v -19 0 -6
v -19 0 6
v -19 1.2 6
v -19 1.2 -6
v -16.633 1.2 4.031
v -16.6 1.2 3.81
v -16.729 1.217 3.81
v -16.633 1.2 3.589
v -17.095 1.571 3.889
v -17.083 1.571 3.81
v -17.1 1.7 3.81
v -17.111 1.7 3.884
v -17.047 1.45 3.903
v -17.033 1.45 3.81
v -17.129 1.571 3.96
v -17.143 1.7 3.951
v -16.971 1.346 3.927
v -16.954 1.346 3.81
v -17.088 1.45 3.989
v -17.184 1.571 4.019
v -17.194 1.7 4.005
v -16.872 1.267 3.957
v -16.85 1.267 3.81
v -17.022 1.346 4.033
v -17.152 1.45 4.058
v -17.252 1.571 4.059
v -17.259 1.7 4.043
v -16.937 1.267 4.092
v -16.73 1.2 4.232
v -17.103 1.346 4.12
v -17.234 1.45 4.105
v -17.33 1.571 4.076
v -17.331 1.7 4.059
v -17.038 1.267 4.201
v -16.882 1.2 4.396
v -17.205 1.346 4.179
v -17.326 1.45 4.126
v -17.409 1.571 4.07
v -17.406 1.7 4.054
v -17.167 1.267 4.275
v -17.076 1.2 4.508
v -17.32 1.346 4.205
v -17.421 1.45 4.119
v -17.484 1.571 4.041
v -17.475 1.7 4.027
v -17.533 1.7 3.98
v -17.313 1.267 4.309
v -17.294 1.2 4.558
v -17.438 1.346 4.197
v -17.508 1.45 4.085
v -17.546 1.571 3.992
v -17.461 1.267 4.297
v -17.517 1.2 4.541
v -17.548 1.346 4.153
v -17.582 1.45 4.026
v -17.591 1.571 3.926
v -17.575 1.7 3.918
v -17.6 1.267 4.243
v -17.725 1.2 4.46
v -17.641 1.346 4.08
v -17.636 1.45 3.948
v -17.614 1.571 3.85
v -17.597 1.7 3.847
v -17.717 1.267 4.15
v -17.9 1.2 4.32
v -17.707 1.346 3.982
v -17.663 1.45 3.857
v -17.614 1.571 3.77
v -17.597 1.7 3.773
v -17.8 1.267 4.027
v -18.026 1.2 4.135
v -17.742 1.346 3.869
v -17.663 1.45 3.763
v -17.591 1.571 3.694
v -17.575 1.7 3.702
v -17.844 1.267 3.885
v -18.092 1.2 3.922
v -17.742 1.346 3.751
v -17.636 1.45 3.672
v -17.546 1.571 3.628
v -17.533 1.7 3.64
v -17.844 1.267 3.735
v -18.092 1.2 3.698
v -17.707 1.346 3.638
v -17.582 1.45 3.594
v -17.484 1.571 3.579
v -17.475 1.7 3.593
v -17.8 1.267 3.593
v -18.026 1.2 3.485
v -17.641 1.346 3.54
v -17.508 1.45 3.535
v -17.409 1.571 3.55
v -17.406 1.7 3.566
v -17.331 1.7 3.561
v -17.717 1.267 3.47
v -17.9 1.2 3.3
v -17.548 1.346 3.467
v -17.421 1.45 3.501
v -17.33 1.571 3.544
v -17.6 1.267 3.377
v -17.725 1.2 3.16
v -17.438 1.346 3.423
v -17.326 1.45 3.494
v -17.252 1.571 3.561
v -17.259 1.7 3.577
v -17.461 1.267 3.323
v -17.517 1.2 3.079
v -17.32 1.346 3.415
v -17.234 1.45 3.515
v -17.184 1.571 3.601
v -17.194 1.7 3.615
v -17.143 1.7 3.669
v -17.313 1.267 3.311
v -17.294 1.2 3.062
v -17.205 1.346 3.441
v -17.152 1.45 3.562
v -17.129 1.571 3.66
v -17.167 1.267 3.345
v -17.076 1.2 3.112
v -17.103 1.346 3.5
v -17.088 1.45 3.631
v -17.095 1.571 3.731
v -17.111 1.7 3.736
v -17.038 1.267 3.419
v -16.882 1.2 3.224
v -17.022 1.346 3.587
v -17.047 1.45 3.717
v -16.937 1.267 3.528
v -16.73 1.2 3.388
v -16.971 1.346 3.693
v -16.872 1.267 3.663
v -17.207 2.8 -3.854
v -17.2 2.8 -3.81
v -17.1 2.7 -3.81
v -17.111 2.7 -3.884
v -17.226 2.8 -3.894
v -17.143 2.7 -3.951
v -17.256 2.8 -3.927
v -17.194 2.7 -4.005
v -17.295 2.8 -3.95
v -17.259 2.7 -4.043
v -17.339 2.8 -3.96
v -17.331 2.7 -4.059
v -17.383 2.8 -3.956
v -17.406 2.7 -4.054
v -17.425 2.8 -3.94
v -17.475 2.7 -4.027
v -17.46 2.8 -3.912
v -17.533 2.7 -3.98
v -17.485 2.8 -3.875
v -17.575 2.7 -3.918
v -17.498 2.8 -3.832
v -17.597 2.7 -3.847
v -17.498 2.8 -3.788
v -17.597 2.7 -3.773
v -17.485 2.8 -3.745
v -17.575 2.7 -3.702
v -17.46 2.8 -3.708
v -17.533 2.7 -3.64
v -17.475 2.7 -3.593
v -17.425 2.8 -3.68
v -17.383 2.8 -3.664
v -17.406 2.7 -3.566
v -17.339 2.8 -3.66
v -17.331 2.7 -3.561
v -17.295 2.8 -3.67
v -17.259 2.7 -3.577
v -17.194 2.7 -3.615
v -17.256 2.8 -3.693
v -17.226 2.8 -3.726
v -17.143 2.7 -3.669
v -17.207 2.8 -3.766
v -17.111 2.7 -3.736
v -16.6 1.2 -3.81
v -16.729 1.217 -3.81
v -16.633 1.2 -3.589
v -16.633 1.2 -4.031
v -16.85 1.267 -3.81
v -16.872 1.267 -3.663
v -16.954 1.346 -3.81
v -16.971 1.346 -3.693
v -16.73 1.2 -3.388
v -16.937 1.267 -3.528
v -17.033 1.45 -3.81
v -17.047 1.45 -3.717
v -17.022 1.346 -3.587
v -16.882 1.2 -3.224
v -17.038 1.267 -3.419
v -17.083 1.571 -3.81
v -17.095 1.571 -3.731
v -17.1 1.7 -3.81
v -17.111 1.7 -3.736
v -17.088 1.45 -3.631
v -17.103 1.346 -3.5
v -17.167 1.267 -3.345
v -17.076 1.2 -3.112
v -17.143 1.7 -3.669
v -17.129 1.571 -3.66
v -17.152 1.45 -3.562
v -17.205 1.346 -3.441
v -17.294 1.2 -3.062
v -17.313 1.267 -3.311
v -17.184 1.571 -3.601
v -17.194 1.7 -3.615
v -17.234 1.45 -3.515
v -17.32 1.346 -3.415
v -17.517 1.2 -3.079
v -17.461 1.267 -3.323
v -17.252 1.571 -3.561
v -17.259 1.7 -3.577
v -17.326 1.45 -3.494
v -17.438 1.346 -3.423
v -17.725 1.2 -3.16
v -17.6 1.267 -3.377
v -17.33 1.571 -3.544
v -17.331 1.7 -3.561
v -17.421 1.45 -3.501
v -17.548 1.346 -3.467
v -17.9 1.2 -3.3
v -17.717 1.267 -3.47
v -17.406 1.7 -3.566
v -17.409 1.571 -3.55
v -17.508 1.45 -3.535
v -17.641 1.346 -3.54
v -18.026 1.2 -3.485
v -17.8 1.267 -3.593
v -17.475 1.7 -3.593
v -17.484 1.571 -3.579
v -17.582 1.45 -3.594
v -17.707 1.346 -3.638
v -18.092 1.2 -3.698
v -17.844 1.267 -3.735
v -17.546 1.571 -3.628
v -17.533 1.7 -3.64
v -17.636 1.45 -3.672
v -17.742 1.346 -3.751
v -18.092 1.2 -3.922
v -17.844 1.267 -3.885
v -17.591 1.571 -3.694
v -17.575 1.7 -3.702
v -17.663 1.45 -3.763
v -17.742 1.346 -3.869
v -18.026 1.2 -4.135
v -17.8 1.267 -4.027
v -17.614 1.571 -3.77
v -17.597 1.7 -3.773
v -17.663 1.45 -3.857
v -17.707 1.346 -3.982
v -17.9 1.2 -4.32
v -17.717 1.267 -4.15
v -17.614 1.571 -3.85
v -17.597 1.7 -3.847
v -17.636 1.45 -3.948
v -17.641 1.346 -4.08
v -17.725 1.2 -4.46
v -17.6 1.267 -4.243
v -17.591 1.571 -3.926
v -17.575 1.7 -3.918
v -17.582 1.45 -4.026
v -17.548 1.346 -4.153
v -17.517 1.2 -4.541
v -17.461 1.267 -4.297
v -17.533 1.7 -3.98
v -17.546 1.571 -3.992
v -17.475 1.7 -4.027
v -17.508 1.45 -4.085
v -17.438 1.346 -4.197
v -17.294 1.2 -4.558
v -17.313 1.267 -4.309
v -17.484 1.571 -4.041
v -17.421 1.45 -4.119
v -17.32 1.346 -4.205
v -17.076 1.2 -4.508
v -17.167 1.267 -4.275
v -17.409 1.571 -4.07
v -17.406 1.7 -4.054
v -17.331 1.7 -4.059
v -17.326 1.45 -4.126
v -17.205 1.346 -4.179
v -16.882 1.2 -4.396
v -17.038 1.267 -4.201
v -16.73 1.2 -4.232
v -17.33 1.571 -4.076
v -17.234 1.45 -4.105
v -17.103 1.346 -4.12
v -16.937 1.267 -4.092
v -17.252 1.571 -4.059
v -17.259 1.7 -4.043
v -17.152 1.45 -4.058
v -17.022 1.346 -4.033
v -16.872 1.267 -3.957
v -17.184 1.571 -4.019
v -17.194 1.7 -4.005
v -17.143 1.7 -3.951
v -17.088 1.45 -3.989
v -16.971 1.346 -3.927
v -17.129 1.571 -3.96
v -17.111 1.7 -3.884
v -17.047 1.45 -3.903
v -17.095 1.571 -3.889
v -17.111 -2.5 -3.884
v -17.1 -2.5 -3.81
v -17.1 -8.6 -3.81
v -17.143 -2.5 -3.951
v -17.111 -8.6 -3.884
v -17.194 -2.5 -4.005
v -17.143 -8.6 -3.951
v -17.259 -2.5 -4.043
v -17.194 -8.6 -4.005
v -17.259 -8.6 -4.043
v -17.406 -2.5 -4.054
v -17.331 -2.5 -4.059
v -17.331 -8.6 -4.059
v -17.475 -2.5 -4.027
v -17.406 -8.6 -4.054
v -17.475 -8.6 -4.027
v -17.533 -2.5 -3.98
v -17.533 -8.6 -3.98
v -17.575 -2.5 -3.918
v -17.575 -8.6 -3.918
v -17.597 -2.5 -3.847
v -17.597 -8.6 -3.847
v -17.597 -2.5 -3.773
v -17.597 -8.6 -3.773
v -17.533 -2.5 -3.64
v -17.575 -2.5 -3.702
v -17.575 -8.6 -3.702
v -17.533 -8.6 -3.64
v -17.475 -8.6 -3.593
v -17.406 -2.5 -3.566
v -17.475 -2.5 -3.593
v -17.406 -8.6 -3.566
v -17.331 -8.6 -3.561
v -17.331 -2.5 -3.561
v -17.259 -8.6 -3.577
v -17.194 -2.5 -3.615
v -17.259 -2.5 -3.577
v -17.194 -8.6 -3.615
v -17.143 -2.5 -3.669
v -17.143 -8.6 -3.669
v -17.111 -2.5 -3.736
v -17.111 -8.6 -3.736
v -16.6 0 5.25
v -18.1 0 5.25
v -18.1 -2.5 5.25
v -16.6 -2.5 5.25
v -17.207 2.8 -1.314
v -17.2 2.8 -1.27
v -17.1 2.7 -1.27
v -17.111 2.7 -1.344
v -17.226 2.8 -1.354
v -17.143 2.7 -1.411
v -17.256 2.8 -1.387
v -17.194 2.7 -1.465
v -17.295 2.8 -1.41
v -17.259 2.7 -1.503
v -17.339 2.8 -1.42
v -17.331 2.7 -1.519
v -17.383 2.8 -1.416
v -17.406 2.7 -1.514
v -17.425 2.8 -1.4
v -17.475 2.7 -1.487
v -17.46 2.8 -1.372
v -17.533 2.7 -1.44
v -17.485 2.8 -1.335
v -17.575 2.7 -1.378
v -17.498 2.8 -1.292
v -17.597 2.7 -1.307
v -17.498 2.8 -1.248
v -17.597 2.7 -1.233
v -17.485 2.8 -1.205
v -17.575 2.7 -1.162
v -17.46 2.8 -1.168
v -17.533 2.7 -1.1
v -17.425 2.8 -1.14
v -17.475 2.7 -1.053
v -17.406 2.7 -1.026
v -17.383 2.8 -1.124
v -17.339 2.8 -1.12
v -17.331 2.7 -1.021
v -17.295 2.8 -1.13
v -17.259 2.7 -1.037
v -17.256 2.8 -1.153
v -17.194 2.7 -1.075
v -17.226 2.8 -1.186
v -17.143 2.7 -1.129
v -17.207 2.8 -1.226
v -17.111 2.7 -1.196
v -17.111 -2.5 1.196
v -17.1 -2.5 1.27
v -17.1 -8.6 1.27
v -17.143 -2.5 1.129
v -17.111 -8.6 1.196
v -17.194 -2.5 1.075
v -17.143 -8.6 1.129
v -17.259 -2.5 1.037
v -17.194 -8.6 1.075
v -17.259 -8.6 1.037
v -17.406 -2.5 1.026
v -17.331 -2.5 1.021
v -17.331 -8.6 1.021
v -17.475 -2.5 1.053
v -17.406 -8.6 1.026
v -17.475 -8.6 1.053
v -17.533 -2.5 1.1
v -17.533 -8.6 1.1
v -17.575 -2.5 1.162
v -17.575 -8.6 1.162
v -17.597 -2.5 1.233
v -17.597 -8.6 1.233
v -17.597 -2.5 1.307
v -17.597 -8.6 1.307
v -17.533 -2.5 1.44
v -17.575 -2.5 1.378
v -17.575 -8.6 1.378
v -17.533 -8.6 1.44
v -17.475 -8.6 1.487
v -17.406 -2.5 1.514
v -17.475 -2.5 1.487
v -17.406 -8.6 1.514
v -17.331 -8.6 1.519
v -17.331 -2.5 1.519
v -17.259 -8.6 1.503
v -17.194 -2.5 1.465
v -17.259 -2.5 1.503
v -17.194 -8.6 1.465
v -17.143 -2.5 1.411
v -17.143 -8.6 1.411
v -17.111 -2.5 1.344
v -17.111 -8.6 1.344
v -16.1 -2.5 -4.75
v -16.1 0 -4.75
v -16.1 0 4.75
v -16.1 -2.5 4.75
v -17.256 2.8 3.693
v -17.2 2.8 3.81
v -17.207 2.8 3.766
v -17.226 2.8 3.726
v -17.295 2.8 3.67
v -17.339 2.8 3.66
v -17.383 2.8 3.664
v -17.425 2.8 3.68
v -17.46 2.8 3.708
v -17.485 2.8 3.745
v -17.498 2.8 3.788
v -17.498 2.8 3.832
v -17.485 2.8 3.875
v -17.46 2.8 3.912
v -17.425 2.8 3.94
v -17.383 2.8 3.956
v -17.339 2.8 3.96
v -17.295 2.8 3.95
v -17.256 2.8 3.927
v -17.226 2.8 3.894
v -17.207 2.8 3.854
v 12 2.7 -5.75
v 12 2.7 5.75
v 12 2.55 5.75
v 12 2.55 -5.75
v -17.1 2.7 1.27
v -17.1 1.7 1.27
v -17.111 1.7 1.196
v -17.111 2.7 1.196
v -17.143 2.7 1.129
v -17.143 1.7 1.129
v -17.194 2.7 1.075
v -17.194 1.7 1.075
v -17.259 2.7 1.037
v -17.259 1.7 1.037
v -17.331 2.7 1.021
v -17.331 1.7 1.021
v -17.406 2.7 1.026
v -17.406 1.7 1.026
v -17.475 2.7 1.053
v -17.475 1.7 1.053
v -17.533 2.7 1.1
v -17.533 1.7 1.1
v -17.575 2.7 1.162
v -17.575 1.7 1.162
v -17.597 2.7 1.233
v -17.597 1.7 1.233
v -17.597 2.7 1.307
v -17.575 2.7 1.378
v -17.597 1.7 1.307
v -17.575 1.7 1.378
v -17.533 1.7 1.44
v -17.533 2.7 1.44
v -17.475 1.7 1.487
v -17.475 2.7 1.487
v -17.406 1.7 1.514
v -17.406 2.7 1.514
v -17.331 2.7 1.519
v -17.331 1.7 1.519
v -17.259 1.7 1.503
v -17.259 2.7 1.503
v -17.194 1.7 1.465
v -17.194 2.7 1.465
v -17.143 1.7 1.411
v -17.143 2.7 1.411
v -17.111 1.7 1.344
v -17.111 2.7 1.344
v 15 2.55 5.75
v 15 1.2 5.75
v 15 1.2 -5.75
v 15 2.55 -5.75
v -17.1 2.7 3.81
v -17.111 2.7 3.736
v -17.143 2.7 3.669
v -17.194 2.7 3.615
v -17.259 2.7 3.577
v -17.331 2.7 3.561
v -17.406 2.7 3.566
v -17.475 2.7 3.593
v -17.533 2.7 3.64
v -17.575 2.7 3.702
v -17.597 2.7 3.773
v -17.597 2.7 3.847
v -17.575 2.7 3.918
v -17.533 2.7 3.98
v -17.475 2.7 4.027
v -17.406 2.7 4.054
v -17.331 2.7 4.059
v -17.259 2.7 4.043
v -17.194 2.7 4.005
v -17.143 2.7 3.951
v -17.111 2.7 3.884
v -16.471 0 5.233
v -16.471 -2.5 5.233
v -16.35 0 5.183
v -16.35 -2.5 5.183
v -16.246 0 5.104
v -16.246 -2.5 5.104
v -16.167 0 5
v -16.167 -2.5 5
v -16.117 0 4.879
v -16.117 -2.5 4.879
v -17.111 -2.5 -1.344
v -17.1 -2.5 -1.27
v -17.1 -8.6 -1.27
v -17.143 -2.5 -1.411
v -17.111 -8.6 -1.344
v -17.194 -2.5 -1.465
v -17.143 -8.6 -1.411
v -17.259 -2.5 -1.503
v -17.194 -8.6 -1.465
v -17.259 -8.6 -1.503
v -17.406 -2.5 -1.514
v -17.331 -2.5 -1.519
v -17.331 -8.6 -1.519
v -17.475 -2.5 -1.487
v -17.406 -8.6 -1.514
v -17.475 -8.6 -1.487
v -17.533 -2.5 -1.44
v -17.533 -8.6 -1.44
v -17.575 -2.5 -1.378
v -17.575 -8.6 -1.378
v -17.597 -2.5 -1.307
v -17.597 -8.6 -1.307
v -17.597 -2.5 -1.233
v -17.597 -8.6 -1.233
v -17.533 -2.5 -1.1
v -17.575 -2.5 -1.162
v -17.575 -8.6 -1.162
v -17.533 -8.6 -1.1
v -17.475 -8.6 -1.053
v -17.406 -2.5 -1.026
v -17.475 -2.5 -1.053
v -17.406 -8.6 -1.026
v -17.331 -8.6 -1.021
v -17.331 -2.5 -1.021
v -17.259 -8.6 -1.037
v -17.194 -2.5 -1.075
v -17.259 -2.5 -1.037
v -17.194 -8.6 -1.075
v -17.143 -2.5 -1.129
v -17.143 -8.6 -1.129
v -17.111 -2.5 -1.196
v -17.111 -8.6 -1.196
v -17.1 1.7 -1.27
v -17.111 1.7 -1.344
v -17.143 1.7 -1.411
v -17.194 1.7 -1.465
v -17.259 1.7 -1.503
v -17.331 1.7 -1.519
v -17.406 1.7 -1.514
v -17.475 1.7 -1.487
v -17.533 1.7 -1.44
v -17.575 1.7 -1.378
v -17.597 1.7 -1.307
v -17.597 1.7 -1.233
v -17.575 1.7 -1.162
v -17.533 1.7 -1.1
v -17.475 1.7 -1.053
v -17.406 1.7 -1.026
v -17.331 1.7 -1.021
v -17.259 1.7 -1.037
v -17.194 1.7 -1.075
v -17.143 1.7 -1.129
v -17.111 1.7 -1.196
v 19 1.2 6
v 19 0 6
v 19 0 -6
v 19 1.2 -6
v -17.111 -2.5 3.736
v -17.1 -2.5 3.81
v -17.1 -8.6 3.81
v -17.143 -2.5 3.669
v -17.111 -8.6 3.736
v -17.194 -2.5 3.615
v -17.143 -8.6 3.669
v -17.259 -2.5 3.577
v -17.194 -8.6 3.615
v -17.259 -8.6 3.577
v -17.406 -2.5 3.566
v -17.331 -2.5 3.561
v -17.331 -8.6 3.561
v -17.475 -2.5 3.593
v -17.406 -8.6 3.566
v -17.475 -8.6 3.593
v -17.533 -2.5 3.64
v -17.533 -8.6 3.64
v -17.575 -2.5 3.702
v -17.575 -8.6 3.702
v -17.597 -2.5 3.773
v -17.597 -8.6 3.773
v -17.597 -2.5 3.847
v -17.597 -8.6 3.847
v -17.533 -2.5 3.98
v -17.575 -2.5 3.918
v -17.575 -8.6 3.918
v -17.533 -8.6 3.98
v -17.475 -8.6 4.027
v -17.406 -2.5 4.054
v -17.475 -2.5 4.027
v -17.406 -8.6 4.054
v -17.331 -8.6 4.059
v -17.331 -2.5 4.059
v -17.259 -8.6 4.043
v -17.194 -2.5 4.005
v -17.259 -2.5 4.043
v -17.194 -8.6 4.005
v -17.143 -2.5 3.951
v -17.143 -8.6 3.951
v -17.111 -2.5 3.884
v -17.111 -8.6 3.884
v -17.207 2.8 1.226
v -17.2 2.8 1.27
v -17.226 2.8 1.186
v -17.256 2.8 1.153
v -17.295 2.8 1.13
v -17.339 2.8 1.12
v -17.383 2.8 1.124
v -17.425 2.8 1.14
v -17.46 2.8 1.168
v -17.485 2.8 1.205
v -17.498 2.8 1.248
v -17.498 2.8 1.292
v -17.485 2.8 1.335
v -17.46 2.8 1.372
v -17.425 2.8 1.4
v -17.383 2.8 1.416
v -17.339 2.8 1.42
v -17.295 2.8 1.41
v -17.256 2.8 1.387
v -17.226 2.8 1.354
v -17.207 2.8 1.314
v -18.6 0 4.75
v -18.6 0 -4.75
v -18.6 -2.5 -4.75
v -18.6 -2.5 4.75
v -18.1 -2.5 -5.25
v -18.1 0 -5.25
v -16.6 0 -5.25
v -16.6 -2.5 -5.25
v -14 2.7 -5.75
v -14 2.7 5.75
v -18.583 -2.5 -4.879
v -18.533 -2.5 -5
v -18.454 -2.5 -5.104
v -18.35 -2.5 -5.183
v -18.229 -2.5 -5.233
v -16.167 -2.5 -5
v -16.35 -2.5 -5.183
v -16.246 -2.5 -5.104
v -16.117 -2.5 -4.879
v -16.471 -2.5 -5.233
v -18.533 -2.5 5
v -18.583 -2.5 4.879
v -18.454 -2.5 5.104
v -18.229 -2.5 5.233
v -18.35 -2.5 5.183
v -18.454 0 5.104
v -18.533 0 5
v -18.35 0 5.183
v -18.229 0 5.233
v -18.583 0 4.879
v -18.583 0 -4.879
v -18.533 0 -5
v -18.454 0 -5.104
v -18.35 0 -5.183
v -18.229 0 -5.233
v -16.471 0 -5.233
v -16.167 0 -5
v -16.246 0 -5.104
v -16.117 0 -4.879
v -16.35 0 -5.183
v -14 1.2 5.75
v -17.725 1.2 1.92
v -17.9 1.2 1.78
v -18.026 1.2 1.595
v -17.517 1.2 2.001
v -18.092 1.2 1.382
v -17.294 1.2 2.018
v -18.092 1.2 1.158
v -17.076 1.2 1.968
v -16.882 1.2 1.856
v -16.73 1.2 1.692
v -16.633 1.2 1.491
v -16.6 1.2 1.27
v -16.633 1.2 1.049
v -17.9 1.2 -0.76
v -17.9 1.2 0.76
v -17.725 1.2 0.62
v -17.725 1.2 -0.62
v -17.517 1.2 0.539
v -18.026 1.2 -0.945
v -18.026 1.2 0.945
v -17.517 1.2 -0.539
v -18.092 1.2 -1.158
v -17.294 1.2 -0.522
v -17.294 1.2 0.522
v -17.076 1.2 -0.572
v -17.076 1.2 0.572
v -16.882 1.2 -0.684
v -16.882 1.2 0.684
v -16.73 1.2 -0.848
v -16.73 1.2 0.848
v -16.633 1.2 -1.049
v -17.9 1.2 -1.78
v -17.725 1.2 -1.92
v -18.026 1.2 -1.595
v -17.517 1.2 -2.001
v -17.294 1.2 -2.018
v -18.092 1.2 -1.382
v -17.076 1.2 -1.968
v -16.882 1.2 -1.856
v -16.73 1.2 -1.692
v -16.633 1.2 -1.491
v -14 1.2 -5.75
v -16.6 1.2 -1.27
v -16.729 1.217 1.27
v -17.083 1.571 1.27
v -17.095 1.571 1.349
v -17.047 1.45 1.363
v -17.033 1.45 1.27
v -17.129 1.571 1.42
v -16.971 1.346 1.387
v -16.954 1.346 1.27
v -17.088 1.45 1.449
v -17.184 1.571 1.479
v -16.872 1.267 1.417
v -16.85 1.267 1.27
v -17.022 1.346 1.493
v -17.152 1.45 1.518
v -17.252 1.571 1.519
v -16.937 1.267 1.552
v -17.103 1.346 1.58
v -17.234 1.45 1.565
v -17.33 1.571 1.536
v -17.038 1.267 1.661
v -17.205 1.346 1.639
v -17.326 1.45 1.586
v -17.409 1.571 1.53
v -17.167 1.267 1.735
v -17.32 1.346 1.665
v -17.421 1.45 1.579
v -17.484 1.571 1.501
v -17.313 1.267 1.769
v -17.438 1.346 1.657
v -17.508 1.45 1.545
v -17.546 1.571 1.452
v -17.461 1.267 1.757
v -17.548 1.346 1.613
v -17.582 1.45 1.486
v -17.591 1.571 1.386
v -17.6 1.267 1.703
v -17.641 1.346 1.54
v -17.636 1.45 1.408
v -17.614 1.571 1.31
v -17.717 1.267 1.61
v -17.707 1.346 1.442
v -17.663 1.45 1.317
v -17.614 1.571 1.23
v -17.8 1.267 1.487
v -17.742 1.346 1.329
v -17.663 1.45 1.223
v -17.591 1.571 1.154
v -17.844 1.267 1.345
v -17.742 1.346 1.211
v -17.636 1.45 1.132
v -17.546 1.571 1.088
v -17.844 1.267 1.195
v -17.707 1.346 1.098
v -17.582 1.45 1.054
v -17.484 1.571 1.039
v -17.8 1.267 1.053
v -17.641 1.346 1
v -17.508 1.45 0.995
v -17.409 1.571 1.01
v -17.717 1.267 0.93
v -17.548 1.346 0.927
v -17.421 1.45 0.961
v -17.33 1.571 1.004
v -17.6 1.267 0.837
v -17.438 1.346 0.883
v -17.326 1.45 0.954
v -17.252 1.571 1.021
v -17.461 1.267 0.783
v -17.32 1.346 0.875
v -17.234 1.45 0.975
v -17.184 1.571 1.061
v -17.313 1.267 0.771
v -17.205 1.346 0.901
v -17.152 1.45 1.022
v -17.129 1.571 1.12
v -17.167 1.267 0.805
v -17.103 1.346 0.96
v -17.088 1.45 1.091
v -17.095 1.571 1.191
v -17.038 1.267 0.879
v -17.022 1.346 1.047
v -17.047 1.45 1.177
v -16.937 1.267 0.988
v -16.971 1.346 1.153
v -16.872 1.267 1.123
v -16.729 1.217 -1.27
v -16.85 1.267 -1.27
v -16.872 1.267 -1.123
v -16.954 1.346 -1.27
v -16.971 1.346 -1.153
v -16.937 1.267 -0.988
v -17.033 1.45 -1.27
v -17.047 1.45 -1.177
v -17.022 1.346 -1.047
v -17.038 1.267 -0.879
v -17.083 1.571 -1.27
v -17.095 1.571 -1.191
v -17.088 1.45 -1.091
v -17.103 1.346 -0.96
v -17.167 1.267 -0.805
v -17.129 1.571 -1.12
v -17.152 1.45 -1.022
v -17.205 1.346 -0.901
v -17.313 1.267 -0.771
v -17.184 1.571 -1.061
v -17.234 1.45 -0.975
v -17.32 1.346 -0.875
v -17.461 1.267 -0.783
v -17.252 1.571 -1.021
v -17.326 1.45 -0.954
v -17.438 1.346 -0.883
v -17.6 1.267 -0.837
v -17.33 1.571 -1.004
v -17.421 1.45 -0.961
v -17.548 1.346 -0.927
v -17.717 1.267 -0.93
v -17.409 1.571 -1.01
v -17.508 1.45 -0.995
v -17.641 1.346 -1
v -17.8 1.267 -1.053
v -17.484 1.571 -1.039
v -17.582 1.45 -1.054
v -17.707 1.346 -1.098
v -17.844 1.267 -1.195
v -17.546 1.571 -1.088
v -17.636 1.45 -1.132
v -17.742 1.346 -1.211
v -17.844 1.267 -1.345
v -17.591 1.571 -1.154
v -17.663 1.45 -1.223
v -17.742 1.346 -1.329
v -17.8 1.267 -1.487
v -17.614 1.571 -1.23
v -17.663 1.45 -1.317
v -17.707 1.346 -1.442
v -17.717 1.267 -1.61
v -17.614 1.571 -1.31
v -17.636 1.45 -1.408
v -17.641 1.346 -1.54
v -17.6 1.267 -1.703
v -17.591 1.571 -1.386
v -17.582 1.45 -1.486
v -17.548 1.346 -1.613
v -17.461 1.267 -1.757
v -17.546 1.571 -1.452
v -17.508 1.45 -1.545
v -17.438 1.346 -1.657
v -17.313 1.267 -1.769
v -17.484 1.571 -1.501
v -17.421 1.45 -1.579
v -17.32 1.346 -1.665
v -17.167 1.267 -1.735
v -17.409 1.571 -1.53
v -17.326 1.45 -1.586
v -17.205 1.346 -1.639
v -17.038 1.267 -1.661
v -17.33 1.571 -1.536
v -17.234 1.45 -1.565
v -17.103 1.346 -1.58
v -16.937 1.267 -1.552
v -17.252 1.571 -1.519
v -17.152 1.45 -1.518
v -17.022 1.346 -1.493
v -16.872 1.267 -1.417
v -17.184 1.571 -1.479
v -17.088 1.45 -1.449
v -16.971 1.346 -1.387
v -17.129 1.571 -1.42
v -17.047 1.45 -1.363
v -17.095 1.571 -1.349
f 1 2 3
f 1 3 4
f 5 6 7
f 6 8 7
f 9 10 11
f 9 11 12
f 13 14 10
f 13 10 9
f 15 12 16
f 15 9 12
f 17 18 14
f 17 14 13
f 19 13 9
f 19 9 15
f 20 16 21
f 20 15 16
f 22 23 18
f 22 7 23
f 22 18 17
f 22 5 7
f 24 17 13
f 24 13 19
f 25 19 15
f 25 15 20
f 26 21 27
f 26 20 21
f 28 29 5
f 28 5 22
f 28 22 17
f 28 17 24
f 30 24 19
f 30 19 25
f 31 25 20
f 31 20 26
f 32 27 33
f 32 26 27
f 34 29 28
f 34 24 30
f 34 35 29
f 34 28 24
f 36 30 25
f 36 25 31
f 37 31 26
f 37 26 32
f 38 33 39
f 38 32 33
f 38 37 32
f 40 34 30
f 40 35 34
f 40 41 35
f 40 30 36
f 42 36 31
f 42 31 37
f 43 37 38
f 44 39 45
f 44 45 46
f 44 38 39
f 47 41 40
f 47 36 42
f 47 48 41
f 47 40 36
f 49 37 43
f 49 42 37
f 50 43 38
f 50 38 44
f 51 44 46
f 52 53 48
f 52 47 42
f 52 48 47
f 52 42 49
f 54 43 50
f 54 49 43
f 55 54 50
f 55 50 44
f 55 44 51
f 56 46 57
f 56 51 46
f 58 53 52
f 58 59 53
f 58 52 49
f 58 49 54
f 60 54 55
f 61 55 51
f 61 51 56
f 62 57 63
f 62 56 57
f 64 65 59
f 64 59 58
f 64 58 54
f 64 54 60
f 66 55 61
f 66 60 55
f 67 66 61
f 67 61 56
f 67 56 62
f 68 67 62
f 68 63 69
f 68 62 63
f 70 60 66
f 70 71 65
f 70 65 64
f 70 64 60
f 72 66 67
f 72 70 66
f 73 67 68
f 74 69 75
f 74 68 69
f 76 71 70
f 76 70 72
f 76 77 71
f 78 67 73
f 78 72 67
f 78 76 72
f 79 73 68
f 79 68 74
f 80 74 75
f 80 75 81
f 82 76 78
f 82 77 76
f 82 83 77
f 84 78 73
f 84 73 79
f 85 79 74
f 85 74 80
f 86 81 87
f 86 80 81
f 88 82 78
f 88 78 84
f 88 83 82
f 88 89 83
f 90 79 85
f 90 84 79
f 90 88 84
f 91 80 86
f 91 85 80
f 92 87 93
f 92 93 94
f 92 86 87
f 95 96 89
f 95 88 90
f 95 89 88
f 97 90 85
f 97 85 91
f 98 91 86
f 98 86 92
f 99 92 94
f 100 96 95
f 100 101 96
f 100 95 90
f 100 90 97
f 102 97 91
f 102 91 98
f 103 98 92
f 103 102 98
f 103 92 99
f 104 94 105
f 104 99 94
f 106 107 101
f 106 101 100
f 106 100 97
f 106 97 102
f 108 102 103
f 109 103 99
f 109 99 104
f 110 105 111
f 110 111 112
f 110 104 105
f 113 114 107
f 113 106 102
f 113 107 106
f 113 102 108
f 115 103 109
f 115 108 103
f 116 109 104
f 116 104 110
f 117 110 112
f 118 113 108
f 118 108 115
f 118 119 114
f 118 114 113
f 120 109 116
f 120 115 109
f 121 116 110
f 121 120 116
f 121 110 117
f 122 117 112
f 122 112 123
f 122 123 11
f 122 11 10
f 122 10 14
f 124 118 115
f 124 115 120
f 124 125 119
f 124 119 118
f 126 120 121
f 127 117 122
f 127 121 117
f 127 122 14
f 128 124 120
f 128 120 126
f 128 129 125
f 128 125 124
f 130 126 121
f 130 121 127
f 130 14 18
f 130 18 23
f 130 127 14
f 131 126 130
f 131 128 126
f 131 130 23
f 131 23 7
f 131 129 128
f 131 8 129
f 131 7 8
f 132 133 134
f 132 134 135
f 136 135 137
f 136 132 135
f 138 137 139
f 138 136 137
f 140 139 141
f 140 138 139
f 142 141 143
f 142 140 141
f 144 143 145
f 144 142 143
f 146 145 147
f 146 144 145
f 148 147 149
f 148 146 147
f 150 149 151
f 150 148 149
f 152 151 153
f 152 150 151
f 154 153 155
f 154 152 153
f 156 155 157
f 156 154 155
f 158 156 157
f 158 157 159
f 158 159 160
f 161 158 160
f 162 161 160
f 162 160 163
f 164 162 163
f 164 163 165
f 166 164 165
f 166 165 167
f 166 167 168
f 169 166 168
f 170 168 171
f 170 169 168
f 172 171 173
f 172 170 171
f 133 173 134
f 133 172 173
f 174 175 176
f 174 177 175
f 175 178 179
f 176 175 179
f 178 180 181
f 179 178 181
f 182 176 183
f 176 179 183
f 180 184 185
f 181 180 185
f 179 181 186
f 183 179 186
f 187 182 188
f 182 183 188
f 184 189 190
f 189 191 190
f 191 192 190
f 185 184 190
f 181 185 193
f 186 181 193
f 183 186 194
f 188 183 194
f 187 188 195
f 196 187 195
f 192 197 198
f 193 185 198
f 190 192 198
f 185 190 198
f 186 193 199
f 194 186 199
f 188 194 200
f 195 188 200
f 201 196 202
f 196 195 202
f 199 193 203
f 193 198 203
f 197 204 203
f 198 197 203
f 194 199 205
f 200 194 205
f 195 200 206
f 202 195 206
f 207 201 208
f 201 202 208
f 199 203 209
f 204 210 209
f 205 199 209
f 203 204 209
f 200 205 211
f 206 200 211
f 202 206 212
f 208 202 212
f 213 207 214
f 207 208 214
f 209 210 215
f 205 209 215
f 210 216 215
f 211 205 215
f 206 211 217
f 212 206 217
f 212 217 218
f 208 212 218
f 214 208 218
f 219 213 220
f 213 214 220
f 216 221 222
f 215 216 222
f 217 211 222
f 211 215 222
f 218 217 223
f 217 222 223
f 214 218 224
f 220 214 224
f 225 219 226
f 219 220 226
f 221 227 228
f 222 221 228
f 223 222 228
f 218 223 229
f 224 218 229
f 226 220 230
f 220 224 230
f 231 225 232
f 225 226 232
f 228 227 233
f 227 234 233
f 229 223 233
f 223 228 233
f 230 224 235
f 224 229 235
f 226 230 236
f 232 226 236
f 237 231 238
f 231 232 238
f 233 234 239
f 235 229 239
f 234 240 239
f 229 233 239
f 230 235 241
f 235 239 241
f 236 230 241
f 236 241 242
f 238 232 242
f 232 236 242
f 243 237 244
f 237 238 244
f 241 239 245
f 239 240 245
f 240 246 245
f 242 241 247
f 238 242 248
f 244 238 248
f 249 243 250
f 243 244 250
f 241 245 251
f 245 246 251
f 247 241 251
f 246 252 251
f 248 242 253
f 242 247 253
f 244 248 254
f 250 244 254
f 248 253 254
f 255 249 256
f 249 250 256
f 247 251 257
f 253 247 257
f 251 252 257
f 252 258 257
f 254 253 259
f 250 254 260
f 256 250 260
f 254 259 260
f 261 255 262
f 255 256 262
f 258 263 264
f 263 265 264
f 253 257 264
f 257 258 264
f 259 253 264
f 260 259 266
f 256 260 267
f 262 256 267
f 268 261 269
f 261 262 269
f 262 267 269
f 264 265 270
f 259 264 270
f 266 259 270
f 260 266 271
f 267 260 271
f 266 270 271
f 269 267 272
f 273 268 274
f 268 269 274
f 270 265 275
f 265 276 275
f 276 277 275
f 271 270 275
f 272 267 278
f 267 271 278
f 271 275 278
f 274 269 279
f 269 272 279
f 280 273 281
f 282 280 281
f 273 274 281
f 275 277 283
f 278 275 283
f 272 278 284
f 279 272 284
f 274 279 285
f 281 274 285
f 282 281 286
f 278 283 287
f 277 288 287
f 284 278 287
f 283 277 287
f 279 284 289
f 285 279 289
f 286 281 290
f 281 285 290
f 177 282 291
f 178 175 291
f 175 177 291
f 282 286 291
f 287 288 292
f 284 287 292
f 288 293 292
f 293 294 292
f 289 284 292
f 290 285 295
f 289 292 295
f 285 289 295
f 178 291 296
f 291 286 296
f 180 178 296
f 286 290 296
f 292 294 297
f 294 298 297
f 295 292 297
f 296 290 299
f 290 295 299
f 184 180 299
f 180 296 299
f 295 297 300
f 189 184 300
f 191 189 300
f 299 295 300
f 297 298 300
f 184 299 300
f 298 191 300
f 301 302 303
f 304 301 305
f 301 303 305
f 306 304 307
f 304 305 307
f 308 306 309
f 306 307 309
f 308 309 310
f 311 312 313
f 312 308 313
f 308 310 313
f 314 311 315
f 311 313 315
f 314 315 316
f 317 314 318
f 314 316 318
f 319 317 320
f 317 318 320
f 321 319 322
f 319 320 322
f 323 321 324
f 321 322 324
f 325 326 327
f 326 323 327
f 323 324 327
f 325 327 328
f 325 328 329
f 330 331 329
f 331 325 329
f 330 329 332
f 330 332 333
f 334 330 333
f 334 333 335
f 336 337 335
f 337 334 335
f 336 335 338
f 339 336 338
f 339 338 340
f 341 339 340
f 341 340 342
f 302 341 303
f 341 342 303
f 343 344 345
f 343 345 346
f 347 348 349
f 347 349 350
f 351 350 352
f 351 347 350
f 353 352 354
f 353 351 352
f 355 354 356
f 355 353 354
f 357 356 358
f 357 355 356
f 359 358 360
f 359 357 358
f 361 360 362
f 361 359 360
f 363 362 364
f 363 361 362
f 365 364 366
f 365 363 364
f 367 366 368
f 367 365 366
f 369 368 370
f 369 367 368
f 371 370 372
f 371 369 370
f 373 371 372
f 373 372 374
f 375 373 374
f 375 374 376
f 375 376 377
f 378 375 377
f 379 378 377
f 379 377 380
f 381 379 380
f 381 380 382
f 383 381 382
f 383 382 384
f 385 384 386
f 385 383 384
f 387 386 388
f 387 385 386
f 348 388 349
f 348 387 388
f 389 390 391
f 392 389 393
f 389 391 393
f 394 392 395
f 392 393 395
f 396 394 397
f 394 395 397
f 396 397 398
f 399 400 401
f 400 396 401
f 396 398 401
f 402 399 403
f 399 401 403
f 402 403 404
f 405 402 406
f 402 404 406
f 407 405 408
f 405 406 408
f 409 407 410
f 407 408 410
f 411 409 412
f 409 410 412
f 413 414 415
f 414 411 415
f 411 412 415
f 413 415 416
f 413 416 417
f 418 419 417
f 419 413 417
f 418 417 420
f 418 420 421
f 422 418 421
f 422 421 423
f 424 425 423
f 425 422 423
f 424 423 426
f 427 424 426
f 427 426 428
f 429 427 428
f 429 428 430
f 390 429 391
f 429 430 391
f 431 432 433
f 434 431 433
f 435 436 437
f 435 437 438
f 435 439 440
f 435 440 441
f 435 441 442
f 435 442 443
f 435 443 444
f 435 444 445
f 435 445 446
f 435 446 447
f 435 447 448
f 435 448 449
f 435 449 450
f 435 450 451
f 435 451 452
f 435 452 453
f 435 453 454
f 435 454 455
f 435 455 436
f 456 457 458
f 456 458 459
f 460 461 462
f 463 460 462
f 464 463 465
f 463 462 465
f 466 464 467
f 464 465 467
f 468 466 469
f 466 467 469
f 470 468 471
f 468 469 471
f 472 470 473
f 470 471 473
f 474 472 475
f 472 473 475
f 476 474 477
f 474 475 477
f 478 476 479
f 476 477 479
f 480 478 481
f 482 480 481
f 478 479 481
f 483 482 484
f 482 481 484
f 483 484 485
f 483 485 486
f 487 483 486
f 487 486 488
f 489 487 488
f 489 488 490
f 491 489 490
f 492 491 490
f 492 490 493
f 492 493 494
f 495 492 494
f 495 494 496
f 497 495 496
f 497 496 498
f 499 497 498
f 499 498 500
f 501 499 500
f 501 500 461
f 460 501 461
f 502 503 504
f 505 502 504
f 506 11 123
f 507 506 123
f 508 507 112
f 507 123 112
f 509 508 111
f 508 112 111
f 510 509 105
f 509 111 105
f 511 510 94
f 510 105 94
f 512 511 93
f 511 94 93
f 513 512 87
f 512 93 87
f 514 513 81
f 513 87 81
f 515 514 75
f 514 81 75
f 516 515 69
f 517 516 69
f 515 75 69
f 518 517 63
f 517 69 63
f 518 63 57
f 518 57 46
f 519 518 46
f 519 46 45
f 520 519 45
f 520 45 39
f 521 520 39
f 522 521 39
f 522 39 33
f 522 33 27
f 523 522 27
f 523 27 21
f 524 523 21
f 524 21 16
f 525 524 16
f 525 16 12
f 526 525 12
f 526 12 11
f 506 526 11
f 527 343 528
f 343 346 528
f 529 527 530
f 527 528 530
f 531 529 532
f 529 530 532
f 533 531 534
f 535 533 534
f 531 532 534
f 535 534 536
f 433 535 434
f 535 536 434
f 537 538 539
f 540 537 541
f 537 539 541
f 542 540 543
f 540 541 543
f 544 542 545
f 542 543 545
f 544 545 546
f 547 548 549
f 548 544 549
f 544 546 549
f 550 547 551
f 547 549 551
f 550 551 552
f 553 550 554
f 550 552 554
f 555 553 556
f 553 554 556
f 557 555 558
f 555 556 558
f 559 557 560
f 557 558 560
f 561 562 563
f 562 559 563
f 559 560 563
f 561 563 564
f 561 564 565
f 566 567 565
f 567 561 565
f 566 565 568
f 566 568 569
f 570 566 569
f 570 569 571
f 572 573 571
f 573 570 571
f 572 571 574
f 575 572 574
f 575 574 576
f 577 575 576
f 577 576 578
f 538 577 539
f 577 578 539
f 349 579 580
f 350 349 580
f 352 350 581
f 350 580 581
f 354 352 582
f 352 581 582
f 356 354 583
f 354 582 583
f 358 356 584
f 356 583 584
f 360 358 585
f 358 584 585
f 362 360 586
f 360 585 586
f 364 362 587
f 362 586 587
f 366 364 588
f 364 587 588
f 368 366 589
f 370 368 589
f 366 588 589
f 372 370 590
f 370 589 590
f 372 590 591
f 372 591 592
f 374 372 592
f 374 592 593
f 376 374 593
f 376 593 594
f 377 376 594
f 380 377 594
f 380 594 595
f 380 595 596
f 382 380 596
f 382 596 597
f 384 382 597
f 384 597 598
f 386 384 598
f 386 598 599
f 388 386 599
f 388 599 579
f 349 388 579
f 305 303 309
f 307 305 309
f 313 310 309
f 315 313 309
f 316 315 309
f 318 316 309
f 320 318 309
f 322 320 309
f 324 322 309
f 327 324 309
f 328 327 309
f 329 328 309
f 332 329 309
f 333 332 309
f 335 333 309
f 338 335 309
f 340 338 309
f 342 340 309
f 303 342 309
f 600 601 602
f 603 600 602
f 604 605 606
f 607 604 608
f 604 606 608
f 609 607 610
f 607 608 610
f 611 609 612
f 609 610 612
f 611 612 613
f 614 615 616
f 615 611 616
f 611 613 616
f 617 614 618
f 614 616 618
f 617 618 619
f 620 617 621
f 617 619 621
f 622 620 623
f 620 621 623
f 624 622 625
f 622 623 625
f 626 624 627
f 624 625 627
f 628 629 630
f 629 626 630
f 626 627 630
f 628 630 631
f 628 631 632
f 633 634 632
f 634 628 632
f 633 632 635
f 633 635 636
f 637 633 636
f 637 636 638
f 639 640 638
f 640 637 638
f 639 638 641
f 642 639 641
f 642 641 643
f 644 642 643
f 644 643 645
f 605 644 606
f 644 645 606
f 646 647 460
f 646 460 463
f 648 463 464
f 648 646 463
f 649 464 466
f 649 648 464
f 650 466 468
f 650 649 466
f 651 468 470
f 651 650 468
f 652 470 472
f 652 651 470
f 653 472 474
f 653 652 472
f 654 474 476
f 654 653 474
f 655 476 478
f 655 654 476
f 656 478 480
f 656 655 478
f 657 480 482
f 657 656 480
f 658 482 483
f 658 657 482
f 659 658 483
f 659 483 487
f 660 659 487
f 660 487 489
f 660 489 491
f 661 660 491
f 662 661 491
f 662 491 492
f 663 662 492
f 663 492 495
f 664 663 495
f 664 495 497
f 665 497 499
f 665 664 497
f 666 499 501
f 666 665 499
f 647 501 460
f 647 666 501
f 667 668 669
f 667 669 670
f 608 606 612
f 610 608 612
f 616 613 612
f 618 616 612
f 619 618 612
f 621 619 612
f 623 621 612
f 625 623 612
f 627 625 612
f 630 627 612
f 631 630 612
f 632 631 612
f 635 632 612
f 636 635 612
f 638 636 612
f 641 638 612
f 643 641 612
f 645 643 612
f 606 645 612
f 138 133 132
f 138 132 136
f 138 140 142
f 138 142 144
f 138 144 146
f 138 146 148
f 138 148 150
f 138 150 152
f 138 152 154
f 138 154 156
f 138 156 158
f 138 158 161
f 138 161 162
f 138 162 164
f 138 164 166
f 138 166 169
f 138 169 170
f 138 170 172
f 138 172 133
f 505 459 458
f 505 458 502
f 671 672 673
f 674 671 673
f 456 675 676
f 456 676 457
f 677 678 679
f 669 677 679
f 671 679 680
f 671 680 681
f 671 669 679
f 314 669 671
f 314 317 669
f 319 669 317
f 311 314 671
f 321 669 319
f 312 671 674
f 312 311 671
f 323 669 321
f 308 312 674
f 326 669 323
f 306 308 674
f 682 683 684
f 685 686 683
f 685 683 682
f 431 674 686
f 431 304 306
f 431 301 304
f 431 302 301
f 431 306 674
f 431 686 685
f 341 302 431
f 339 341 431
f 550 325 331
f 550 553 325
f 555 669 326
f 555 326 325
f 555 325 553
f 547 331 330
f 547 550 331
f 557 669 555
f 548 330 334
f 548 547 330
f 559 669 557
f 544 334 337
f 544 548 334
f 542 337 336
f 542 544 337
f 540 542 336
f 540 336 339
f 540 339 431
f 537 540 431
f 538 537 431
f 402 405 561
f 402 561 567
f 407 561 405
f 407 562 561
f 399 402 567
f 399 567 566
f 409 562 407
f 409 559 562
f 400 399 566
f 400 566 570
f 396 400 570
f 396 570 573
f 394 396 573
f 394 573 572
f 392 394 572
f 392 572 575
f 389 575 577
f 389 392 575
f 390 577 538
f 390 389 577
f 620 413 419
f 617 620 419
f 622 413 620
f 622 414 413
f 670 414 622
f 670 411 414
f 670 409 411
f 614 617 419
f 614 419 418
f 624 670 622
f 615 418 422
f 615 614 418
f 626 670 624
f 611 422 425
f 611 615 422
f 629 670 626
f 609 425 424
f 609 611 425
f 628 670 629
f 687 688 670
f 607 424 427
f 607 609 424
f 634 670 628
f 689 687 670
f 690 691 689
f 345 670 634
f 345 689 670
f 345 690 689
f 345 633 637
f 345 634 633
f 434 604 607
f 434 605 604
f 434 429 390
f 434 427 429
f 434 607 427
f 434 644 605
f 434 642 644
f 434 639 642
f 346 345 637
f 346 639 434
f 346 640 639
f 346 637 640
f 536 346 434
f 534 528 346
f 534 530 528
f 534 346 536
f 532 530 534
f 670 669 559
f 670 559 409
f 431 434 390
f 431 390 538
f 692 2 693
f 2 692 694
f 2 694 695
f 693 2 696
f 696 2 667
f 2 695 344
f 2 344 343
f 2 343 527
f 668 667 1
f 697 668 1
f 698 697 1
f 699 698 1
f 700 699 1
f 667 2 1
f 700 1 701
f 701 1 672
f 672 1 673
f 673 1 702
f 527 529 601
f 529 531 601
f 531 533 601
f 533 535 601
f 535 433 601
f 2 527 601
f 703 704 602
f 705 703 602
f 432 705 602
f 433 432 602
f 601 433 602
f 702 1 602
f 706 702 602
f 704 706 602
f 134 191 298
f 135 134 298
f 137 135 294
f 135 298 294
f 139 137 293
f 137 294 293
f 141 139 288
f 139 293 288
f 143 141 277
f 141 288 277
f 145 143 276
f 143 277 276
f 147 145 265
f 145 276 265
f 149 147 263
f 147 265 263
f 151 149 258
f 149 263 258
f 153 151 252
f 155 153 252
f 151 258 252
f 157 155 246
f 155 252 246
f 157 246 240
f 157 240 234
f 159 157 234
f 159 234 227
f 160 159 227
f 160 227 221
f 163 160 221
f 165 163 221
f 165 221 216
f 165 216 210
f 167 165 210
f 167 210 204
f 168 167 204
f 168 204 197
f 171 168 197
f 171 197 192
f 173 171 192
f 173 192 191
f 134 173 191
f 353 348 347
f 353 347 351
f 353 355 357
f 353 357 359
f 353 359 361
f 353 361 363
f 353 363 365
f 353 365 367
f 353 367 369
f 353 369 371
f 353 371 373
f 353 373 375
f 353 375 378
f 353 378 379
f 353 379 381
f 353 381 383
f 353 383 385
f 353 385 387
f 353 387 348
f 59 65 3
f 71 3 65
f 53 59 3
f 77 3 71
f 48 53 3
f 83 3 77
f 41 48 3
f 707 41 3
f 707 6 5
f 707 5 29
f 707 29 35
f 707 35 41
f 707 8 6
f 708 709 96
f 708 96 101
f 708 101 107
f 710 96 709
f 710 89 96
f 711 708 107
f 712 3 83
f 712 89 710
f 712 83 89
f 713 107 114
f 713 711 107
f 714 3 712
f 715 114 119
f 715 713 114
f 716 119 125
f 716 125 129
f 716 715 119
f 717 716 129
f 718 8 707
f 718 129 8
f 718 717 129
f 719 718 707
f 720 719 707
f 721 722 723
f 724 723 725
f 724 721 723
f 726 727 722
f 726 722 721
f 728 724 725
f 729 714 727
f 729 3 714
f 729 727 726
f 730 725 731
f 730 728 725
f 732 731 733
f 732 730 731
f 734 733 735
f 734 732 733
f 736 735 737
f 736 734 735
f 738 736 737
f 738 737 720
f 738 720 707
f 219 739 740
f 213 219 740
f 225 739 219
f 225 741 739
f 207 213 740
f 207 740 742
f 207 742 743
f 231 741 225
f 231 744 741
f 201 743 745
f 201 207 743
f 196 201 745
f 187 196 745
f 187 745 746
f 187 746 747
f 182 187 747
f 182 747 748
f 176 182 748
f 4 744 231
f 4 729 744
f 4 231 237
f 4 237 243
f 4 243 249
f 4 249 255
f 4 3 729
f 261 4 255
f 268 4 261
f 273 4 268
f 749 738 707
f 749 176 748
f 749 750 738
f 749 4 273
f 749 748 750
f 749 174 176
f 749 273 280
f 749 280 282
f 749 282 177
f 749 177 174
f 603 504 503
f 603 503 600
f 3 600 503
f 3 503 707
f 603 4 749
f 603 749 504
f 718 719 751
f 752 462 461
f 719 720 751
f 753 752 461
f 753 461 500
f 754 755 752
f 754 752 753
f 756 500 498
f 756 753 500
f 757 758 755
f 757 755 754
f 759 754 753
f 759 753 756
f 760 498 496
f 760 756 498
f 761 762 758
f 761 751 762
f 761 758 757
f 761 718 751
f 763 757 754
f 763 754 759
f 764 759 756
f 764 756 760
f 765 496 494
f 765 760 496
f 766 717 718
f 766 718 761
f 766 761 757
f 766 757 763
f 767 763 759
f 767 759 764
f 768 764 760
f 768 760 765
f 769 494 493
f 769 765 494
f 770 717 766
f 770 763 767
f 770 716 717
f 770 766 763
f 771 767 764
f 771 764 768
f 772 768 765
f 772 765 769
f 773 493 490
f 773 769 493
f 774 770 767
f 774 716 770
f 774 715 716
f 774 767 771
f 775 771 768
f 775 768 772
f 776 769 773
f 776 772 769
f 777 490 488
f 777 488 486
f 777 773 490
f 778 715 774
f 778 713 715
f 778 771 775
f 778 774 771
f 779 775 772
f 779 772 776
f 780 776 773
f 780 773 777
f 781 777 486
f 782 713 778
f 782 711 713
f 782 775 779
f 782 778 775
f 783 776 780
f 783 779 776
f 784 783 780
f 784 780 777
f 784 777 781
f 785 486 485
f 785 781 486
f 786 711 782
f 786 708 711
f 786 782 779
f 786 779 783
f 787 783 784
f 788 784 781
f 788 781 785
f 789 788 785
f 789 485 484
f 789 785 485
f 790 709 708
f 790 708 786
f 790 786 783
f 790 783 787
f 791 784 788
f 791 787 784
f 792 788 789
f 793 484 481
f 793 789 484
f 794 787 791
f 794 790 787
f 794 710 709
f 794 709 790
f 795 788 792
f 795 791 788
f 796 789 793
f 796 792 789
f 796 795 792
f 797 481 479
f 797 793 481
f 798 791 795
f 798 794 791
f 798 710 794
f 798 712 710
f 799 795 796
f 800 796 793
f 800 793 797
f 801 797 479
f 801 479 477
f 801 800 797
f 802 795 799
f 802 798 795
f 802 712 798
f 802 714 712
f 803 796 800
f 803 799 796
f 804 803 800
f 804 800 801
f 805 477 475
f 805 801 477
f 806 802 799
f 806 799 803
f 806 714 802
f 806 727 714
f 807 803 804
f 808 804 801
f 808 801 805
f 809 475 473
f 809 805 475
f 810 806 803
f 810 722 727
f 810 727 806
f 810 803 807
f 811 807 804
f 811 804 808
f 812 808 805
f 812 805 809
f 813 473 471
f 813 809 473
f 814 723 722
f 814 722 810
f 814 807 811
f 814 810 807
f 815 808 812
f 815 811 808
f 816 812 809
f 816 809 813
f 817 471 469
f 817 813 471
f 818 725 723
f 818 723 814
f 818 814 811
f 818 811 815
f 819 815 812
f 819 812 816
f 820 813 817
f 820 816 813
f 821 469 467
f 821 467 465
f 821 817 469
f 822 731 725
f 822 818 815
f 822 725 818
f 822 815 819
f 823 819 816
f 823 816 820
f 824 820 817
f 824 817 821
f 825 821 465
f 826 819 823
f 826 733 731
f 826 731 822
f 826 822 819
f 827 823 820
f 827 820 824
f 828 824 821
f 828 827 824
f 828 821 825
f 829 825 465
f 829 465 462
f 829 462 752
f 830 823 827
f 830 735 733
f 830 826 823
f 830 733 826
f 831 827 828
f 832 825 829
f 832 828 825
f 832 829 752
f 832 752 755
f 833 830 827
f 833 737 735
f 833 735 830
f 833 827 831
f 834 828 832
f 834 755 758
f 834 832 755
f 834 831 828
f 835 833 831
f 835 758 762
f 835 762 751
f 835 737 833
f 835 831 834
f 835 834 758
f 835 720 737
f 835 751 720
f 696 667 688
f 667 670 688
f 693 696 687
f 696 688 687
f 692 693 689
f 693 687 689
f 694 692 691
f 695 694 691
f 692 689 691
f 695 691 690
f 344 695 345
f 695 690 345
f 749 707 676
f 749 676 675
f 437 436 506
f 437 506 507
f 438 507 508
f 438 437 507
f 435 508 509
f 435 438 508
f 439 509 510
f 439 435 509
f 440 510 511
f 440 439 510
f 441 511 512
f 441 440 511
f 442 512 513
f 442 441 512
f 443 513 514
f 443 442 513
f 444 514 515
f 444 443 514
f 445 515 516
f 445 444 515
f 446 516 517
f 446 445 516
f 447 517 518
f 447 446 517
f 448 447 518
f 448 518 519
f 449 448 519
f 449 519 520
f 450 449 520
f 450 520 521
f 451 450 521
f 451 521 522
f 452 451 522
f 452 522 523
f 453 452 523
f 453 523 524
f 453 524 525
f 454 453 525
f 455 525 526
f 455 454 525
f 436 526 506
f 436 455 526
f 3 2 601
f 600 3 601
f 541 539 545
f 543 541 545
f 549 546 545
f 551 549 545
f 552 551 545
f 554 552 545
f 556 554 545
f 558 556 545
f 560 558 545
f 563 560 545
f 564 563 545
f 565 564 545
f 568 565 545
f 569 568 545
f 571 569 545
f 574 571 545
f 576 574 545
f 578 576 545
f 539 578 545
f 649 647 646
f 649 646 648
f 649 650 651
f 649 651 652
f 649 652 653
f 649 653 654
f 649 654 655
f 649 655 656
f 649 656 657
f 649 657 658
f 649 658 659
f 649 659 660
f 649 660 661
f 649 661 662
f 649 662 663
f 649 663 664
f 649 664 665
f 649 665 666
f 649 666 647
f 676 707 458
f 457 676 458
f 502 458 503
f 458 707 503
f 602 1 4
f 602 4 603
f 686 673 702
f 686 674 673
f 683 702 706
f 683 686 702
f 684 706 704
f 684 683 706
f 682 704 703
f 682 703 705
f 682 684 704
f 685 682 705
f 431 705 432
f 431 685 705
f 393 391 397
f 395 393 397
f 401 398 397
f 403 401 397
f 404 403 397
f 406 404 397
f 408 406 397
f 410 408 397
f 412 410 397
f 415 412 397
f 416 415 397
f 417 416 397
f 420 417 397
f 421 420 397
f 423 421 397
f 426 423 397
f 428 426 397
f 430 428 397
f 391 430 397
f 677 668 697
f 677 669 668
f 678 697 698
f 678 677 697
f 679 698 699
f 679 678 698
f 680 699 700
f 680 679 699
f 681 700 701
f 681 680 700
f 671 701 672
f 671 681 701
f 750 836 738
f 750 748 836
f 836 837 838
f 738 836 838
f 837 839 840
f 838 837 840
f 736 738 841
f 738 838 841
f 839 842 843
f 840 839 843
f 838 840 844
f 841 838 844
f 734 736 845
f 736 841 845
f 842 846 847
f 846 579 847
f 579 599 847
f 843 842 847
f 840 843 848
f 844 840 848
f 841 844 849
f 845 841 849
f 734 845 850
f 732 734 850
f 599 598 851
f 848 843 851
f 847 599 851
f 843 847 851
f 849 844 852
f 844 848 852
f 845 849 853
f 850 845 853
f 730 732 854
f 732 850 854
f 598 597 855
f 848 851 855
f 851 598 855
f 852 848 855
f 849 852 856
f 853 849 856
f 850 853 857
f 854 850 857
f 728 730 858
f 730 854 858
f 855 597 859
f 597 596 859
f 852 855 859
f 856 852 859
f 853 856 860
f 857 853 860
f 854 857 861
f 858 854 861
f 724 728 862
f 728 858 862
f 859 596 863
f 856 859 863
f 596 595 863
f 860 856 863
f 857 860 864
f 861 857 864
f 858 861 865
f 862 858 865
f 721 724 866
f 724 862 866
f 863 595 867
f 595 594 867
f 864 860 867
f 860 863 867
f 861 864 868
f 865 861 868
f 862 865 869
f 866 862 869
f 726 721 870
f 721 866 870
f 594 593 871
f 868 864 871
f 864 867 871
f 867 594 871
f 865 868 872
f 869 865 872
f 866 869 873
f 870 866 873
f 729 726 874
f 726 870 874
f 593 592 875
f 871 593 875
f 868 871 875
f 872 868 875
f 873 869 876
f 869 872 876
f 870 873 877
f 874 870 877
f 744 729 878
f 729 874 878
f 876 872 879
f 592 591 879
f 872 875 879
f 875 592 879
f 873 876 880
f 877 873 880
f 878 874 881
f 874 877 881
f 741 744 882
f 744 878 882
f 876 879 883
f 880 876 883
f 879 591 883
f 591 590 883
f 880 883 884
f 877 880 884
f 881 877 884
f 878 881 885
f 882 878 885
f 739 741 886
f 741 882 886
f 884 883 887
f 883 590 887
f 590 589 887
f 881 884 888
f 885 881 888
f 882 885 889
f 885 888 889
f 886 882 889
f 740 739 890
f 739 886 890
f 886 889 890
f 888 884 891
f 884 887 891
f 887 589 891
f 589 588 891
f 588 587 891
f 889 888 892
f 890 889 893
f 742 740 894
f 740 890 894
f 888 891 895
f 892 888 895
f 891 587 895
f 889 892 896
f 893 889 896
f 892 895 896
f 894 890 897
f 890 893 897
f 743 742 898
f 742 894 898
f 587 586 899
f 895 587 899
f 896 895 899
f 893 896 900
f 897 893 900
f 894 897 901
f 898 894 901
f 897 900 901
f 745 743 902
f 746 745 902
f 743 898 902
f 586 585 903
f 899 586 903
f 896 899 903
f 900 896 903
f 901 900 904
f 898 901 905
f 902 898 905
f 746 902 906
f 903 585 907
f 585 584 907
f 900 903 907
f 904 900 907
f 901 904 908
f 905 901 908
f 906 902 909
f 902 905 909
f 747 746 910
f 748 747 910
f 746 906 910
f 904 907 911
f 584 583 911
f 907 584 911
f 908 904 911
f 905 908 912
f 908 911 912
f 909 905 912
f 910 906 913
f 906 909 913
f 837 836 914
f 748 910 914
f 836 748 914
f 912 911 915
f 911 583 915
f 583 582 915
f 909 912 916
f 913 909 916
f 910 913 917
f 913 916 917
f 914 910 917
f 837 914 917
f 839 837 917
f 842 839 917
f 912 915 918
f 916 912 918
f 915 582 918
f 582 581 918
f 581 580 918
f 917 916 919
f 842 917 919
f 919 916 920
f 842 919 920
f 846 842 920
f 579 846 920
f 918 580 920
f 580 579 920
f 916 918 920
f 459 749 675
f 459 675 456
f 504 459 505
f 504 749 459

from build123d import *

# Parameters (mm, degrees)
SKETCH1_W                  = 38
SKETCH1_H                  = 12
BOSS_EXTRUDE1_DEPTH        = 1.2
SKETCH2_W                  = 29
SKETCH2_H                  = 11.5
BOSS_EXTRUDE2_DEPTH        = 1.5
BOSS_EXTRUDE3_START        = -9.8
SKETCH3_R                  = 0.25
BOSS_EXTRUDE3_DEPTH        = 11.4
CHAMFER1_SIZE              = 0.1
FILLET1_R                  = 0.5
LPATTERN1_COUNT            = 4
LPATTERN1_PITCH            = 2.54
CHAMFER1_OF_LPATTERN1_SIZE = 0.1
FILLET1_OF_LPATTERN1_R     = 0.5
SKETCH4_W                  = 2.5
SKETCH4_H                  = 10.5
BOSS_EXTRUDE4_DEPTH        = 2.5
FILLET2_R                  = 0.5
SKETCH5_W                  = 3
SKETCH5_H                  = 11.5
CUT_EXTRUDE1_DEPTH         = 0.15


with BuildPart() as part:
    # Sketch1 → Boss-Extrude1 (new body)
    with BuildSketch(Plane(origin=(0, 0, 0), x_dir=(1, 0, 0), z_dir=(0, 1, 0))):
        Rectangle(SKETCH1_W, SKETCH1_H)
    extrude(amount=BOSS_EXTRUDE1_DEPTH)

    # Sketch2 → Boss-Extrude2 (add)
    with BuildSketch(Plane(origin=(0, 1.2, 0), x_dir=(1, 0, 0), z_dir=(0, 1, 0))):
        with Locations((0.5, 0)):
            Rectangle(SKETCH2_W, SKETCH2_H)
    extrude(amount=BOSS_EXTRUDE2_DEPTH)

    # Sketch3 → Boss-Extrude3 (add)
    with BuildSketch(Plane(origin=(0, 1.2, 0), x_dir=(1, 0, 0), z_dir=(0, 1, 0)).offset(BOSS_EXTRUDE3_START)):
        with Locations((-17.35, -3.81)):
            Circle(SKETCH3_R)
    boss_extrude3 = extrude(amount=BOSS_EXTRUDE3_DEPTH)

    # Chamfer1
    chamfer1_edges = [part.edges().sort_by_distance(p)[0] for p in [
        (-17.6, 2.8, 3.81),
    ]]
    chamfer(chamfer1_edges, length=CHAMFER1_SIZE)

    # Fillet1
    fillet1_edges = [part.edges().sort_by_distance(p)[0] for p in [
        (-17.6, 1.2, 3.81),
    ]]
    fillet(fillet1_edges, radius=FILLET1_R)

    # LPattern1: Boss-Extrude3 ×4
    with Locations(*[(0, 0, -i * LPATTERN1_PITCH) for i in range(1, LPATTERN1_COUNT)]):
        add(boss_extrude3)

    # Chamfer1 of LPattern1
    chamfer1_of_lpattern1_edges = [part.edges().sort_by_distance(p)[0] for p in [
        (-17.6, 2.8, 1.27),
        (-17.6, 2.8, -1.27),
        (-17.6, 2.8, -3.81),
    ]]
    chamfer(chamfer1_of_lpattern1_edges, length=CHAMFER1_OF_LPATTERN1_SIZE)

    # Fillet1 of LPattern1
    fillet1_of_lpattern1_edges = [part.edges().sort_by_distance(p)[0] for p in [
        (-17.6, 1.2, 1.27),
        (-17.6, 1.2, -1.27),
        (-17.6, 1.2, -3.81),
    ]]
    fillet(fillet1_of_lpattern1_edges, radius=FILLET1_OF_LPATTERN1_R)

    # Sketch4 → Boss-Extrude4 (add)
    with BuildSketch(Plane.XZ):
        with Locations((-17.35, 0)):
            Rectangle(SKETCH4_W, SKETCH4_H)
    extrude(amount=BOSS_EXTRUDE4_DEPTH)

    # Fillet2
    fillet2_edges = [part.edges().sort_by_distance(p)[0] for p in [
        (-16.1, -1.25, -5.25),
        (-16.1, -1.25, 5.25),
        (-18.6, -1.25, 5.25),
        (-18.6, -1.25, -5.25),
    ]]
    fillet(fillet2_edges, radius=FILLET2_R)

    # Sketch5 → Cut-Extrude1 (cut)
    with BuildSketch(Plane(origin=(0, 2.7, 0), x_dir=(1, 0, 0), z_dir=(0, 1, 0))):
        with Locations((13.5, 0)):
            Rectangle(SKETCH5_W, SKETCH5_H)
    extrude(amount=-CUT_EXTRUDE1_DEPTH, mode=Mode.SUBTRACT)


solid = part.part
